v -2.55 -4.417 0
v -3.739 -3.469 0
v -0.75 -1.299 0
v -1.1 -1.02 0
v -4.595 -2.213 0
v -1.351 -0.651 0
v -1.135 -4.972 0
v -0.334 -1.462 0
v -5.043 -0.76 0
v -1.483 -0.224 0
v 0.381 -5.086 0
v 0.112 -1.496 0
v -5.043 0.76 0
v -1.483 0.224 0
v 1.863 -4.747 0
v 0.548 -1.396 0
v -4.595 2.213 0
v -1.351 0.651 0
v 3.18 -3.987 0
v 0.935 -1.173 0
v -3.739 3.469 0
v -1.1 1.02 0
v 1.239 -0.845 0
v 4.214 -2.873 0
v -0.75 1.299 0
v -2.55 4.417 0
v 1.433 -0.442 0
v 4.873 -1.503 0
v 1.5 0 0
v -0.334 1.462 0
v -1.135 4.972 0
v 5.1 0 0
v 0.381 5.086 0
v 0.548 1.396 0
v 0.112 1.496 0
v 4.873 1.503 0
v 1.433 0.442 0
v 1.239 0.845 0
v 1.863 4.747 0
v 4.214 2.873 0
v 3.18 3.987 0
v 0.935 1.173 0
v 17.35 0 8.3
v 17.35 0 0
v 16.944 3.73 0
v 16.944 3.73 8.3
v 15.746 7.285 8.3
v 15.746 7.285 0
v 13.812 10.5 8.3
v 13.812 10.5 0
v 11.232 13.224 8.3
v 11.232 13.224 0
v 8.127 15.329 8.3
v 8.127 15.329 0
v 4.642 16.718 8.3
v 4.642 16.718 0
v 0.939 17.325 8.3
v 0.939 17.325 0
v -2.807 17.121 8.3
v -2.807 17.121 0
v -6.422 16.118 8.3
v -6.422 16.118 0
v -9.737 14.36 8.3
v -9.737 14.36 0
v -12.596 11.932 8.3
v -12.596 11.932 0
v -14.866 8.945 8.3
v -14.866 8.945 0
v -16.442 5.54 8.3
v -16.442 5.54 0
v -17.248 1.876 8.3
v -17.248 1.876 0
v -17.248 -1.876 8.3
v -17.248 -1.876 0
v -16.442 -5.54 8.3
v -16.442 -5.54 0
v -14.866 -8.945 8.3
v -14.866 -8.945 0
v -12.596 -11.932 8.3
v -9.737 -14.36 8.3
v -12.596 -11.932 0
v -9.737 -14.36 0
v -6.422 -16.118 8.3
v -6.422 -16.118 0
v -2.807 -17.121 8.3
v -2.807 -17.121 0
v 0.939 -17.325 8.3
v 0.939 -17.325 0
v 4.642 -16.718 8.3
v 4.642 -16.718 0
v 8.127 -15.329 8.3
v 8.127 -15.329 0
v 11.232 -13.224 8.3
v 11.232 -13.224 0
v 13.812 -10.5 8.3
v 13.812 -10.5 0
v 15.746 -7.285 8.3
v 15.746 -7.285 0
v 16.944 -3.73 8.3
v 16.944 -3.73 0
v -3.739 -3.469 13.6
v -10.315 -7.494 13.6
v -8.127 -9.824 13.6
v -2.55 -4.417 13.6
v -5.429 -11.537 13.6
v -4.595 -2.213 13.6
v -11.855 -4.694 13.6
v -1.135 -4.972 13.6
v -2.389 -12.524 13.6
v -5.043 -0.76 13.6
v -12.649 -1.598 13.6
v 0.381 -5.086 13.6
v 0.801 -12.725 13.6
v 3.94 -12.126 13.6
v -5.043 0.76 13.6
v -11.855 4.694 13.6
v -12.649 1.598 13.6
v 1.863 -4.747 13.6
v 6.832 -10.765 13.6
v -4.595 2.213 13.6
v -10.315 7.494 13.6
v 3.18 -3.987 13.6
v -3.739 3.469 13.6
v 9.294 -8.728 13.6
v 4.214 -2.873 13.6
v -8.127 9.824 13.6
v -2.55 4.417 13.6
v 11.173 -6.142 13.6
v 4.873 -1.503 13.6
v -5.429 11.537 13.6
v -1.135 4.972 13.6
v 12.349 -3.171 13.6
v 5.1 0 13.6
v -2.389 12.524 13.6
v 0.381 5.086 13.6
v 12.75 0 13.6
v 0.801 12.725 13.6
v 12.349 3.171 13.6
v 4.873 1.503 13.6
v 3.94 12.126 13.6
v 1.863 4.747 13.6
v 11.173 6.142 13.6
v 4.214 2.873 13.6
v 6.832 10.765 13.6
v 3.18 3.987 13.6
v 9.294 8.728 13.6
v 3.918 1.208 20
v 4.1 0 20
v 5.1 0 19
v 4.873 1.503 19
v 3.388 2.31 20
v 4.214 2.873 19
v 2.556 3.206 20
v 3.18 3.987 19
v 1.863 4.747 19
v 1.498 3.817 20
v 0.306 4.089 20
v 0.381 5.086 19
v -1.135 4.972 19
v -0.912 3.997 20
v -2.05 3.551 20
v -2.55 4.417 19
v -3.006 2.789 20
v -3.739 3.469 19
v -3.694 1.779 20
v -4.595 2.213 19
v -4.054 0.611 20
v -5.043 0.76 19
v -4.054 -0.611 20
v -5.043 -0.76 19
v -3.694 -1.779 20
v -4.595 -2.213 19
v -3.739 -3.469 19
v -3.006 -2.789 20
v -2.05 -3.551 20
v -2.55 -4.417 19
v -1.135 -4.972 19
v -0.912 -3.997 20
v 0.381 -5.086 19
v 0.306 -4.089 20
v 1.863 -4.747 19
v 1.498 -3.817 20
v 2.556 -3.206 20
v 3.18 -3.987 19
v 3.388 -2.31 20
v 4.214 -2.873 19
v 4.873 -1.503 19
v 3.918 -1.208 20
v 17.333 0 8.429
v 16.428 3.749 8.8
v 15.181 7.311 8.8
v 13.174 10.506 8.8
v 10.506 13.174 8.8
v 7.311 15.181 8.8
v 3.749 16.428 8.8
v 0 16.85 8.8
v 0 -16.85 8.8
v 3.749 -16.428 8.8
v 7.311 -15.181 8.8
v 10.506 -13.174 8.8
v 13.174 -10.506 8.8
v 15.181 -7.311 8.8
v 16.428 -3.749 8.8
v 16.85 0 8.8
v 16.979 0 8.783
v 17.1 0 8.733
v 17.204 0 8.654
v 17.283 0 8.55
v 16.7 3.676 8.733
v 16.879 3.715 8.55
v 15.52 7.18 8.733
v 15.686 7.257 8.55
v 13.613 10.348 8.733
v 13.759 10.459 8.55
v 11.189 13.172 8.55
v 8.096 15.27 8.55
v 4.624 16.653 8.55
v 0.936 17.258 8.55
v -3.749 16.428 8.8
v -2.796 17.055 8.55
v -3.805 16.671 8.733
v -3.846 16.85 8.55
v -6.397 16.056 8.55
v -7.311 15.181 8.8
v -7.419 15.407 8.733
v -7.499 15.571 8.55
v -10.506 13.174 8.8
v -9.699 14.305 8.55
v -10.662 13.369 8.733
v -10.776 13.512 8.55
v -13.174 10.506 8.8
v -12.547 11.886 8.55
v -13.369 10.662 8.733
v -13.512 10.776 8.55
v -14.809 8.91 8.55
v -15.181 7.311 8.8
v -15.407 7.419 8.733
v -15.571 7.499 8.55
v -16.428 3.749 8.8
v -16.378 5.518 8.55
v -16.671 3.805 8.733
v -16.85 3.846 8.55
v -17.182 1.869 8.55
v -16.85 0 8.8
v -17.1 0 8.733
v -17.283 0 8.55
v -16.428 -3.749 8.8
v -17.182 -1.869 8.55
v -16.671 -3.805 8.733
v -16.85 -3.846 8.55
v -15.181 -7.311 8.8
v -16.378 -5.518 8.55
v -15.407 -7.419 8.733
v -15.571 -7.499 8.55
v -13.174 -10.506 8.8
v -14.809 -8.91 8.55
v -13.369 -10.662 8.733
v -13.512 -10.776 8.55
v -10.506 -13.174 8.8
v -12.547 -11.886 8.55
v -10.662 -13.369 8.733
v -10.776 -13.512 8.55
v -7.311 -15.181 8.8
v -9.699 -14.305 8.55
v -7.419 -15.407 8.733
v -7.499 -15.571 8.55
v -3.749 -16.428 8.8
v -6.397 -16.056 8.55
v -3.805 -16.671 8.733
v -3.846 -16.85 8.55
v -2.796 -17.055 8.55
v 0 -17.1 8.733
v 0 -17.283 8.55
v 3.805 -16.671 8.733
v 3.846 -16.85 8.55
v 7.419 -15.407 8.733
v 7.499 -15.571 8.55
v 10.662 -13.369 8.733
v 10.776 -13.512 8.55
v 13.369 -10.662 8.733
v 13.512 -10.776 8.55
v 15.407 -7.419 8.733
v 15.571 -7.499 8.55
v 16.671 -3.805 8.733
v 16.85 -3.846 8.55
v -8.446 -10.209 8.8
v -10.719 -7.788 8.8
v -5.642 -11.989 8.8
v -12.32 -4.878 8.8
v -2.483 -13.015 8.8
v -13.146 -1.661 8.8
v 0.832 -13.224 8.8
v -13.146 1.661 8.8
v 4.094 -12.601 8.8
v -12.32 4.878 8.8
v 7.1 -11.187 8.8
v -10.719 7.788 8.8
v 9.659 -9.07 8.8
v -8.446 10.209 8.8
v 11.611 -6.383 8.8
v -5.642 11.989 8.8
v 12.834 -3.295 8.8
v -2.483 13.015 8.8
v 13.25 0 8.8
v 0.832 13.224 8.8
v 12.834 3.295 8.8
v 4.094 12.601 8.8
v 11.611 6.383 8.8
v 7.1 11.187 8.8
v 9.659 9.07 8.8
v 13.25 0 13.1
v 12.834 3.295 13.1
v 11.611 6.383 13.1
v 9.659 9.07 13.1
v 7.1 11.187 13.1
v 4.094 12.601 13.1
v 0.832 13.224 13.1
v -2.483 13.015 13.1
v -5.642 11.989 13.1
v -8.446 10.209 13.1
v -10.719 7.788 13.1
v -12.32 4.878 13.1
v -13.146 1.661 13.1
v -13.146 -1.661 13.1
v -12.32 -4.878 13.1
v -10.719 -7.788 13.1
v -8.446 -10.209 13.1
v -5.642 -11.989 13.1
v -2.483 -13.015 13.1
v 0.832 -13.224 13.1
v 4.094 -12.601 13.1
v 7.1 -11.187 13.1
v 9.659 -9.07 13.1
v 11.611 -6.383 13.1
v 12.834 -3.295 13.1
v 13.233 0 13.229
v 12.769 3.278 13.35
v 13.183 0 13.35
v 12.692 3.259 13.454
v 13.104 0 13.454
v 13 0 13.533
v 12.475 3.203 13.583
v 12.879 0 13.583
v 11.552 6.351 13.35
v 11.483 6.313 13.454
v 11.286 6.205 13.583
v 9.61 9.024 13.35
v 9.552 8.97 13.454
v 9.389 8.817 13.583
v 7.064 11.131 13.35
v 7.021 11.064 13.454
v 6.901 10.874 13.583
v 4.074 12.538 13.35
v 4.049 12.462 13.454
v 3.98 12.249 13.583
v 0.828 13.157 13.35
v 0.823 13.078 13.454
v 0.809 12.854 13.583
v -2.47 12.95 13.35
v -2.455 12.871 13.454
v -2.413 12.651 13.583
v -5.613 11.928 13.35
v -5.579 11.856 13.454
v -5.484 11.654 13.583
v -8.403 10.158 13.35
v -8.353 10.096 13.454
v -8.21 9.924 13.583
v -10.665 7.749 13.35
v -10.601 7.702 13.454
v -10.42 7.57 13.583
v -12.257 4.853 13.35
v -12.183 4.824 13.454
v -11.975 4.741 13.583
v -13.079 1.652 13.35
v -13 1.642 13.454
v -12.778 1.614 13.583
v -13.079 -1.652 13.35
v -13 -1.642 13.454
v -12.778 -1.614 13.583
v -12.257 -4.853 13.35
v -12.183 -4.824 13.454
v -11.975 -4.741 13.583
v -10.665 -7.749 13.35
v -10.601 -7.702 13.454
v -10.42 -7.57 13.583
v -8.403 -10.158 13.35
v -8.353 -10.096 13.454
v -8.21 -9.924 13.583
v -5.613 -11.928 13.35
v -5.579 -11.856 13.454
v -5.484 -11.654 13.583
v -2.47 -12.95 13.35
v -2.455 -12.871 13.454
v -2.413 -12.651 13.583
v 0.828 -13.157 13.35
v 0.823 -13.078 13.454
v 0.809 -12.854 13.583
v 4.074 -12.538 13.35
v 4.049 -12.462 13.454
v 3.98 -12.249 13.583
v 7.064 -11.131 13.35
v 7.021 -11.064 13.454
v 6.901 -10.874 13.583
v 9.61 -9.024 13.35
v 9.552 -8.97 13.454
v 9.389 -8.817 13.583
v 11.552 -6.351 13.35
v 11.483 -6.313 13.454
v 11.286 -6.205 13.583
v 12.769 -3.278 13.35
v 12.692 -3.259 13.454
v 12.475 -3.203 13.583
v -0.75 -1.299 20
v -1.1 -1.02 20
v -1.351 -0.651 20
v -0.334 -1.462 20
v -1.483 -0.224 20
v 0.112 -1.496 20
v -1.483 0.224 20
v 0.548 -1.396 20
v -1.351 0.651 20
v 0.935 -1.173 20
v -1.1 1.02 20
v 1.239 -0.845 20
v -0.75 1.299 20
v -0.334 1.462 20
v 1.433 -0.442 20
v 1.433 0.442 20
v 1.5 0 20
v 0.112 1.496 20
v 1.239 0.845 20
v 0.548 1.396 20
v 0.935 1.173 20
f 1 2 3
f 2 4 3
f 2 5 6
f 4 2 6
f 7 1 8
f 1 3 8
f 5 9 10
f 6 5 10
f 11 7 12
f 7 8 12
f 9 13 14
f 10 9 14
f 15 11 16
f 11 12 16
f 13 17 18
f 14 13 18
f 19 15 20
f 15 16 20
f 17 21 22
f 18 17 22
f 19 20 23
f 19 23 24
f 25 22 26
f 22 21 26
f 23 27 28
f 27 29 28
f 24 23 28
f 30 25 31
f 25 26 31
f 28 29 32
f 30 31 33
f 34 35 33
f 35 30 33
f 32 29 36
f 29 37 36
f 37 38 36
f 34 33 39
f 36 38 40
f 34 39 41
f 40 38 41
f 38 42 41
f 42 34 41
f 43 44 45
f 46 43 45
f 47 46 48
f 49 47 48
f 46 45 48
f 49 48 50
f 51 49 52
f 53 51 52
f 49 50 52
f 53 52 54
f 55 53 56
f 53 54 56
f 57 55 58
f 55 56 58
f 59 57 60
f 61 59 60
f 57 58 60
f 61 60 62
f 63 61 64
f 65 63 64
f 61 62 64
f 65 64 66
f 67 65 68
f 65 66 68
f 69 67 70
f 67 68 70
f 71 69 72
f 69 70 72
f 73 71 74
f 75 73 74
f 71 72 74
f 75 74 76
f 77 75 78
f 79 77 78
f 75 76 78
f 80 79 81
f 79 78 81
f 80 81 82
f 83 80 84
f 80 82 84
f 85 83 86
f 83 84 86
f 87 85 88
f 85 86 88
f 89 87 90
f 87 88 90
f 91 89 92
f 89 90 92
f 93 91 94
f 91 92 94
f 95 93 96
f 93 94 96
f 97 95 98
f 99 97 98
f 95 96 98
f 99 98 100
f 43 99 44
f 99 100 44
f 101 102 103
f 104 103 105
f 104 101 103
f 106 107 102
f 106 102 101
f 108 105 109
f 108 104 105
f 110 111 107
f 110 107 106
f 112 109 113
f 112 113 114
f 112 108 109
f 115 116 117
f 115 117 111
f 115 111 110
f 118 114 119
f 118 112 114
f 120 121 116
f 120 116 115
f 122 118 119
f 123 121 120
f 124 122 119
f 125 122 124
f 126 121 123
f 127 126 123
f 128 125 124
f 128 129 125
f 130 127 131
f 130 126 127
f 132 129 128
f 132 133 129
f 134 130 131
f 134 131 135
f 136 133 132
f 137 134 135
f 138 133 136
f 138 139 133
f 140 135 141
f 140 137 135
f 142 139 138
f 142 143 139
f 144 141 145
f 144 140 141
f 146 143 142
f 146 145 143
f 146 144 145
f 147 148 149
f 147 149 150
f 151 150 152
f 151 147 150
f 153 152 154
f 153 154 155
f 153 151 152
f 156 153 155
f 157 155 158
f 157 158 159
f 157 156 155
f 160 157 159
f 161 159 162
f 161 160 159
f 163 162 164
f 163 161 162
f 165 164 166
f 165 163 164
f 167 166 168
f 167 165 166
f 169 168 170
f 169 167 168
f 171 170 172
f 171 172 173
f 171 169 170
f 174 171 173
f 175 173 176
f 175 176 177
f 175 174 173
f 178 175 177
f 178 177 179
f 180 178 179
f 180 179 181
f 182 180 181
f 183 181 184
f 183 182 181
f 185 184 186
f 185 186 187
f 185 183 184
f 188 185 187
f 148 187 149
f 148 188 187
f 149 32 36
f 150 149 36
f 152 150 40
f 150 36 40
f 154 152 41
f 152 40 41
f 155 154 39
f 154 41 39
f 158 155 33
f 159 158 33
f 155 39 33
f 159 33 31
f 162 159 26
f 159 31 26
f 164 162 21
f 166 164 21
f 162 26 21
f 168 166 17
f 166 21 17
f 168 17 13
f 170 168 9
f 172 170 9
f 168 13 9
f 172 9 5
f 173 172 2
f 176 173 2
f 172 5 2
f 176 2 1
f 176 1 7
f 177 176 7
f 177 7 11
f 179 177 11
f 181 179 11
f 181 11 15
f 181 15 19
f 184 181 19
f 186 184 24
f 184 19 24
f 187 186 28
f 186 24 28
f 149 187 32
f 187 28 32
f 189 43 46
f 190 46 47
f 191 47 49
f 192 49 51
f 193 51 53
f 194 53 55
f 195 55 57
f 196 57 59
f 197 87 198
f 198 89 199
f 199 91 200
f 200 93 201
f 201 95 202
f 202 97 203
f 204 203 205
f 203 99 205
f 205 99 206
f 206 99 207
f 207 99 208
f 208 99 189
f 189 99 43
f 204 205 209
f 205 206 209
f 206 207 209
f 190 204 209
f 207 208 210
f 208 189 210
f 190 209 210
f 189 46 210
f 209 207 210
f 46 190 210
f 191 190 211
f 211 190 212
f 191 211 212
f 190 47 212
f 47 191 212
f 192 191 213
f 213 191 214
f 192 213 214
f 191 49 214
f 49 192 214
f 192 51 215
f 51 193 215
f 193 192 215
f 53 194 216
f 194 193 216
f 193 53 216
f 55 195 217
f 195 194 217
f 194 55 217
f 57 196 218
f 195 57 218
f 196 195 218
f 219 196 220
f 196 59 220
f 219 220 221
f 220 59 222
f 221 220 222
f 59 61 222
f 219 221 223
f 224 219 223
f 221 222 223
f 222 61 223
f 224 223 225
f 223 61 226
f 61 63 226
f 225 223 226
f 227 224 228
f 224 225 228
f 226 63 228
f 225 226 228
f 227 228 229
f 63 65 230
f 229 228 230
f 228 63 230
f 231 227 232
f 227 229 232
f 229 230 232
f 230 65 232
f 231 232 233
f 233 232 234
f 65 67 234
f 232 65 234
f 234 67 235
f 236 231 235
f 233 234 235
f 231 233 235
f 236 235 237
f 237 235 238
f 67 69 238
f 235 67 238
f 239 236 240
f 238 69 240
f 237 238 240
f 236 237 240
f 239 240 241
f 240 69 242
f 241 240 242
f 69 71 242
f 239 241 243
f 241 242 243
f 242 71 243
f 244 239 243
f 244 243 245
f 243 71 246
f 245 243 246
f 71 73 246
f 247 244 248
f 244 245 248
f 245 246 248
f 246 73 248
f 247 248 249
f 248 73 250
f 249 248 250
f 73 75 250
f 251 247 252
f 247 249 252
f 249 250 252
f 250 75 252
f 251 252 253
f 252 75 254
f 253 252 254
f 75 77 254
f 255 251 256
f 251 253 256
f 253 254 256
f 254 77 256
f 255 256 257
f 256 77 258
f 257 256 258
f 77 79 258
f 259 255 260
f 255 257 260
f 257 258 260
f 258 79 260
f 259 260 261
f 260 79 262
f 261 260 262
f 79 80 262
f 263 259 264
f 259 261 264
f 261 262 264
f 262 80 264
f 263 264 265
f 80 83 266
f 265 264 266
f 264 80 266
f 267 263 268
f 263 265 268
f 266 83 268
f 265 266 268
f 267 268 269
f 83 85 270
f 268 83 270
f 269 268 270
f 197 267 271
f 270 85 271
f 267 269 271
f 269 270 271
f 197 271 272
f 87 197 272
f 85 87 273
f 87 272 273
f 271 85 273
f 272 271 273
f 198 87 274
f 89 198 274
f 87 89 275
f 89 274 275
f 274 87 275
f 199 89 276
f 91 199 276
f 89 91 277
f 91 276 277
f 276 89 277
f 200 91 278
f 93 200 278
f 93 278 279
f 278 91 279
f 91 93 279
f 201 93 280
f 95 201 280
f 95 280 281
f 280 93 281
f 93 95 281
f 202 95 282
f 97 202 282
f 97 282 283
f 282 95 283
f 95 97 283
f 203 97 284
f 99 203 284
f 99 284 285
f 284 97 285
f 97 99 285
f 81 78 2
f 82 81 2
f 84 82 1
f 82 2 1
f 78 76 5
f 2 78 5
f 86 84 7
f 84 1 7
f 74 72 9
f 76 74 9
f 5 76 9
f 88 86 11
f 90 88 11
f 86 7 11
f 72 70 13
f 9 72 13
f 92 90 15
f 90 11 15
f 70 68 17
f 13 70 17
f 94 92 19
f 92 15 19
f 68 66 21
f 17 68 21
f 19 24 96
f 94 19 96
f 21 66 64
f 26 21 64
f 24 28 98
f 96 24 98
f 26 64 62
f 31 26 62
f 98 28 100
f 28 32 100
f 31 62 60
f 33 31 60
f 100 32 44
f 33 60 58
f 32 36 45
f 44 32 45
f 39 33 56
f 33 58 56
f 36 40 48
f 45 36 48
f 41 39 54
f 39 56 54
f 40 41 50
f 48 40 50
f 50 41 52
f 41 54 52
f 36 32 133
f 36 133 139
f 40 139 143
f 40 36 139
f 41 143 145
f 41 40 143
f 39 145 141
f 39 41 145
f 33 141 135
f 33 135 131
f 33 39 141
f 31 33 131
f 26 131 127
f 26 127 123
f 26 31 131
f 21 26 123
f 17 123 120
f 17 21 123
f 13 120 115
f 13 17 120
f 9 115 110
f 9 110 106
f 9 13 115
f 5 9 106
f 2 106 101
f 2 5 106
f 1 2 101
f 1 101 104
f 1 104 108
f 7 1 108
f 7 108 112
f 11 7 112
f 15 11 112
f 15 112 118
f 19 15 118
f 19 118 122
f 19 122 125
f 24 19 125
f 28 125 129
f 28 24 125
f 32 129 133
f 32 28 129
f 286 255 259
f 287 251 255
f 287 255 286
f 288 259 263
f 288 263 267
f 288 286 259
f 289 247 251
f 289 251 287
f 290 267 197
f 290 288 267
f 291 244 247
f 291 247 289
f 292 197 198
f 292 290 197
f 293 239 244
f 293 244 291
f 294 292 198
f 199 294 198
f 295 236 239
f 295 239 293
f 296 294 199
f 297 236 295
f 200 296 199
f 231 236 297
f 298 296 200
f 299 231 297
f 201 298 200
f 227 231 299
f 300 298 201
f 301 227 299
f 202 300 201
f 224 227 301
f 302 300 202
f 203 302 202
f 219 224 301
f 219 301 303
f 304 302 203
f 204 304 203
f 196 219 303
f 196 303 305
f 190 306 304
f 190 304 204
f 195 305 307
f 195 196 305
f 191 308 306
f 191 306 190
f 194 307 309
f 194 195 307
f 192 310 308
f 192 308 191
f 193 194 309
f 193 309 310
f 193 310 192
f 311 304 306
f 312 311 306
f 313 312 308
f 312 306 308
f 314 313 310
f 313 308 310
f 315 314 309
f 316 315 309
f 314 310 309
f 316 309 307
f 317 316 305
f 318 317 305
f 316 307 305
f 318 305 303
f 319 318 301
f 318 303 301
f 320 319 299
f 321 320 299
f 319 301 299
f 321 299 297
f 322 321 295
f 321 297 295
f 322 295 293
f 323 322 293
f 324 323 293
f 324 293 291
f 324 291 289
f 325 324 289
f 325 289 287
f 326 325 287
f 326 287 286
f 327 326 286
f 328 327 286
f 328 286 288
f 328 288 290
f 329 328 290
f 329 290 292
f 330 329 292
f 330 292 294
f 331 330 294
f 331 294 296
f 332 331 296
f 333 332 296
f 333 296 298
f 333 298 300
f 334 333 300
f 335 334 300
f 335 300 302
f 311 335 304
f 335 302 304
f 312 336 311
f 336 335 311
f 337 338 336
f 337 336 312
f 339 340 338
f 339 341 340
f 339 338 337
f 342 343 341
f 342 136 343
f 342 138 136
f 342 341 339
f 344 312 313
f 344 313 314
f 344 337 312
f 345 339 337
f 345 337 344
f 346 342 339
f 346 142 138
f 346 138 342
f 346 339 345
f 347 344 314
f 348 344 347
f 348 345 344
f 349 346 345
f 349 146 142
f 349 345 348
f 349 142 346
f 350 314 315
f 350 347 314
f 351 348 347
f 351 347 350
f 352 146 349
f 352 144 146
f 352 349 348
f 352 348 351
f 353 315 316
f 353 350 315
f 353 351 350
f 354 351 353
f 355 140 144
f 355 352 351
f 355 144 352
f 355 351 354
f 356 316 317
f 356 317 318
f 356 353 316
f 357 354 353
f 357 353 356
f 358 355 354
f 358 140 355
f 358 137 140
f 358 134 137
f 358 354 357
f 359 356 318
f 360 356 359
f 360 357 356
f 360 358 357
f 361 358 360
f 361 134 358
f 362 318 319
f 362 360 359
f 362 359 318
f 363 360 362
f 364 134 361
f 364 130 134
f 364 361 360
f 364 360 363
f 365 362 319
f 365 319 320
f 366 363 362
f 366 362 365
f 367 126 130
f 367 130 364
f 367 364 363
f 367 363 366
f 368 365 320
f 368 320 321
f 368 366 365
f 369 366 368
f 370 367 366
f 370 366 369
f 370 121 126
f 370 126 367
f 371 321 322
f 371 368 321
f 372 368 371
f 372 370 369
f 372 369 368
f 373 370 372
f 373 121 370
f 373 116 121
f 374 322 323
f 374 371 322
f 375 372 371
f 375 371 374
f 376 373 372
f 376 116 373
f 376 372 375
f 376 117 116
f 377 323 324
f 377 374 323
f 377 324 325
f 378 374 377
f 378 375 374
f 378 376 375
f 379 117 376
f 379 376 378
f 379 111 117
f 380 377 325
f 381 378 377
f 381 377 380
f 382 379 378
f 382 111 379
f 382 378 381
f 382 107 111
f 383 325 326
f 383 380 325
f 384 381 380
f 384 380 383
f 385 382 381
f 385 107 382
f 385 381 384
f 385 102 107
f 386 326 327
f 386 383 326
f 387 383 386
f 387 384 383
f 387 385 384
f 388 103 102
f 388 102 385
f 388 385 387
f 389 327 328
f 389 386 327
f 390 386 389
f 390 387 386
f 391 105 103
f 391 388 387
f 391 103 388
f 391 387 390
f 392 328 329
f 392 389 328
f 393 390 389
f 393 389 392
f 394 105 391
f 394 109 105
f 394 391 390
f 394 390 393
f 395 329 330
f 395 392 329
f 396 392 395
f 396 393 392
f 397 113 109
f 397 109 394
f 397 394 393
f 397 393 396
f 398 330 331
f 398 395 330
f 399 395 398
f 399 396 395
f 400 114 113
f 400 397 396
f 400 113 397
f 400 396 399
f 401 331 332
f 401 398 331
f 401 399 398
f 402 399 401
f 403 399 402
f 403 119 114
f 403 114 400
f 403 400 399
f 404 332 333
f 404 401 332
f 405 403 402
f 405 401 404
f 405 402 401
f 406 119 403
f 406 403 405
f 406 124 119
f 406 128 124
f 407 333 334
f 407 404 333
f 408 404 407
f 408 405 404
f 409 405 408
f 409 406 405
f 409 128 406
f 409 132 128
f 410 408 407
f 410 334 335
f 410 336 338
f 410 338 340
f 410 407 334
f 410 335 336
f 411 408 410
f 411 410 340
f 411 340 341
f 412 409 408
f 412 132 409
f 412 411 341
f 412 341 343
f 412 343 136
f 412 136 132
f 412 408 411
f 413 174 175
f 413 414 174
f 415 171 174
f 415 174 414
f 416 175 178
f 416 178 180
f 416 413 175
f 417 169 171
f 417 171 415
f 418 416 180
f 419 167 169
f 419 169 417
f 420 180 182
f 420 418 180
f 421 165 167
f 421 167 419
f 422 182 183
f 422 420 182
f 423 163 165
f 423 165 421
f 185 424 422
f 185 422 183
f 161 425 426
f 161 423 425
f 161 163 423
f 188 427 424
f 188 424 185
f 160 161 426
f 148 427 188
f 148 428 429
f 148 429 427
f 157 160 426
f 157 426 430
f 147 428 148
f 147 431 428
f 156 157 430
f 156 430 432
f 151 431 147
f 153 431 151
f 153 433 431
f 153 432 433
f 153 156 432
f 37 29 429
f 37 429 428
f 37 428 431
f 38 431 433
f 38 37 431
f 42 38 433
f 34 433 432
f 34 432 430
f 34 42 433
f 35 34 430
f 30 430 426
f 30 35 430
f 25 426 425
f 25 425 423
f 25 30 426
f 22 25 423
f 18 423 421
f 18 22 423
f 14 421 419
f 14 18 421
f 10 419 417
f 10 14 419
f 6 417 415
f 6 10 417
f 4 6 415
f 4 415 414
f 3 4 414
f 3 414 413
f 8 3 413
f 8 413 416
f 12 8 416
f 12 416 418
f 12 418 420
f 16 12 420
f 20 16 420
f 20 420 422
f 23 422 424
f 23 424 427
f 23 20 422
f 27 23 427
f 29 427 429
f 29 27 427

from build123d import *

# Parameters (mm, degrees)
F0_R     = 17.35
F0_R_2   = 13.25
F1_DEPTH = 8.8
F0_R_3   = 5.1
F2_DEPTH = 13.6
F0_R_4   = 1.5
F3_DEPTH = 20
F4_R     = 0.5
F5_R     = 0.5
F6_SIZE  = 1


with BuildPart() as f1:
    # F0 (on Top) → F1 (new body)
    with BuildSketch(Plane.XY):
        Circle(F0_R)
        Circle(F0_R_2, mode=Mode.SUBTRACT)
    extrude(amount=F1_DEPTH)

    # F0 (on Top) → F2 (join)
    with BuildSketch(Plane.XY):
        Circle(F0_R_2)
        Circle(F0_R_3, mode=Mode.SUBTRACT)
    extrude(amount=F2_DEPTH)

    # F4
    f4_edges = [f1.edges().sort_by_distance(p)[0] for p in [
        (-13.25, 0, 13.6),
    ]]
    fillet(f4_edges, radius=F4_R)

    # F5
    f5_edges = [f1.edges().sort_by_distance(p)[0] for p in [
        (-17.35, 0, 8.8),
    ]]
    fillet(f5_edges, radius=F5_R)


with BuildPart() as f3:
    # F0 (on Top) → F3 (new body)
    with BuildSketch(Plane.XY):
        Circle(F0_R_3)
        Circle(F0_R_4, mode=Mode.SUBTRACT)
    extrude(amount=F3_DEPTH)

    # F6
    f6_edges = [f3.edges().sort_by_distance(p)[0] for p in [
        (-5.1, 0, 20),
    ]]
    chamfer(f6_edges, length=F6_SIZE)


solid = Compound([f1.part, f3.part])
